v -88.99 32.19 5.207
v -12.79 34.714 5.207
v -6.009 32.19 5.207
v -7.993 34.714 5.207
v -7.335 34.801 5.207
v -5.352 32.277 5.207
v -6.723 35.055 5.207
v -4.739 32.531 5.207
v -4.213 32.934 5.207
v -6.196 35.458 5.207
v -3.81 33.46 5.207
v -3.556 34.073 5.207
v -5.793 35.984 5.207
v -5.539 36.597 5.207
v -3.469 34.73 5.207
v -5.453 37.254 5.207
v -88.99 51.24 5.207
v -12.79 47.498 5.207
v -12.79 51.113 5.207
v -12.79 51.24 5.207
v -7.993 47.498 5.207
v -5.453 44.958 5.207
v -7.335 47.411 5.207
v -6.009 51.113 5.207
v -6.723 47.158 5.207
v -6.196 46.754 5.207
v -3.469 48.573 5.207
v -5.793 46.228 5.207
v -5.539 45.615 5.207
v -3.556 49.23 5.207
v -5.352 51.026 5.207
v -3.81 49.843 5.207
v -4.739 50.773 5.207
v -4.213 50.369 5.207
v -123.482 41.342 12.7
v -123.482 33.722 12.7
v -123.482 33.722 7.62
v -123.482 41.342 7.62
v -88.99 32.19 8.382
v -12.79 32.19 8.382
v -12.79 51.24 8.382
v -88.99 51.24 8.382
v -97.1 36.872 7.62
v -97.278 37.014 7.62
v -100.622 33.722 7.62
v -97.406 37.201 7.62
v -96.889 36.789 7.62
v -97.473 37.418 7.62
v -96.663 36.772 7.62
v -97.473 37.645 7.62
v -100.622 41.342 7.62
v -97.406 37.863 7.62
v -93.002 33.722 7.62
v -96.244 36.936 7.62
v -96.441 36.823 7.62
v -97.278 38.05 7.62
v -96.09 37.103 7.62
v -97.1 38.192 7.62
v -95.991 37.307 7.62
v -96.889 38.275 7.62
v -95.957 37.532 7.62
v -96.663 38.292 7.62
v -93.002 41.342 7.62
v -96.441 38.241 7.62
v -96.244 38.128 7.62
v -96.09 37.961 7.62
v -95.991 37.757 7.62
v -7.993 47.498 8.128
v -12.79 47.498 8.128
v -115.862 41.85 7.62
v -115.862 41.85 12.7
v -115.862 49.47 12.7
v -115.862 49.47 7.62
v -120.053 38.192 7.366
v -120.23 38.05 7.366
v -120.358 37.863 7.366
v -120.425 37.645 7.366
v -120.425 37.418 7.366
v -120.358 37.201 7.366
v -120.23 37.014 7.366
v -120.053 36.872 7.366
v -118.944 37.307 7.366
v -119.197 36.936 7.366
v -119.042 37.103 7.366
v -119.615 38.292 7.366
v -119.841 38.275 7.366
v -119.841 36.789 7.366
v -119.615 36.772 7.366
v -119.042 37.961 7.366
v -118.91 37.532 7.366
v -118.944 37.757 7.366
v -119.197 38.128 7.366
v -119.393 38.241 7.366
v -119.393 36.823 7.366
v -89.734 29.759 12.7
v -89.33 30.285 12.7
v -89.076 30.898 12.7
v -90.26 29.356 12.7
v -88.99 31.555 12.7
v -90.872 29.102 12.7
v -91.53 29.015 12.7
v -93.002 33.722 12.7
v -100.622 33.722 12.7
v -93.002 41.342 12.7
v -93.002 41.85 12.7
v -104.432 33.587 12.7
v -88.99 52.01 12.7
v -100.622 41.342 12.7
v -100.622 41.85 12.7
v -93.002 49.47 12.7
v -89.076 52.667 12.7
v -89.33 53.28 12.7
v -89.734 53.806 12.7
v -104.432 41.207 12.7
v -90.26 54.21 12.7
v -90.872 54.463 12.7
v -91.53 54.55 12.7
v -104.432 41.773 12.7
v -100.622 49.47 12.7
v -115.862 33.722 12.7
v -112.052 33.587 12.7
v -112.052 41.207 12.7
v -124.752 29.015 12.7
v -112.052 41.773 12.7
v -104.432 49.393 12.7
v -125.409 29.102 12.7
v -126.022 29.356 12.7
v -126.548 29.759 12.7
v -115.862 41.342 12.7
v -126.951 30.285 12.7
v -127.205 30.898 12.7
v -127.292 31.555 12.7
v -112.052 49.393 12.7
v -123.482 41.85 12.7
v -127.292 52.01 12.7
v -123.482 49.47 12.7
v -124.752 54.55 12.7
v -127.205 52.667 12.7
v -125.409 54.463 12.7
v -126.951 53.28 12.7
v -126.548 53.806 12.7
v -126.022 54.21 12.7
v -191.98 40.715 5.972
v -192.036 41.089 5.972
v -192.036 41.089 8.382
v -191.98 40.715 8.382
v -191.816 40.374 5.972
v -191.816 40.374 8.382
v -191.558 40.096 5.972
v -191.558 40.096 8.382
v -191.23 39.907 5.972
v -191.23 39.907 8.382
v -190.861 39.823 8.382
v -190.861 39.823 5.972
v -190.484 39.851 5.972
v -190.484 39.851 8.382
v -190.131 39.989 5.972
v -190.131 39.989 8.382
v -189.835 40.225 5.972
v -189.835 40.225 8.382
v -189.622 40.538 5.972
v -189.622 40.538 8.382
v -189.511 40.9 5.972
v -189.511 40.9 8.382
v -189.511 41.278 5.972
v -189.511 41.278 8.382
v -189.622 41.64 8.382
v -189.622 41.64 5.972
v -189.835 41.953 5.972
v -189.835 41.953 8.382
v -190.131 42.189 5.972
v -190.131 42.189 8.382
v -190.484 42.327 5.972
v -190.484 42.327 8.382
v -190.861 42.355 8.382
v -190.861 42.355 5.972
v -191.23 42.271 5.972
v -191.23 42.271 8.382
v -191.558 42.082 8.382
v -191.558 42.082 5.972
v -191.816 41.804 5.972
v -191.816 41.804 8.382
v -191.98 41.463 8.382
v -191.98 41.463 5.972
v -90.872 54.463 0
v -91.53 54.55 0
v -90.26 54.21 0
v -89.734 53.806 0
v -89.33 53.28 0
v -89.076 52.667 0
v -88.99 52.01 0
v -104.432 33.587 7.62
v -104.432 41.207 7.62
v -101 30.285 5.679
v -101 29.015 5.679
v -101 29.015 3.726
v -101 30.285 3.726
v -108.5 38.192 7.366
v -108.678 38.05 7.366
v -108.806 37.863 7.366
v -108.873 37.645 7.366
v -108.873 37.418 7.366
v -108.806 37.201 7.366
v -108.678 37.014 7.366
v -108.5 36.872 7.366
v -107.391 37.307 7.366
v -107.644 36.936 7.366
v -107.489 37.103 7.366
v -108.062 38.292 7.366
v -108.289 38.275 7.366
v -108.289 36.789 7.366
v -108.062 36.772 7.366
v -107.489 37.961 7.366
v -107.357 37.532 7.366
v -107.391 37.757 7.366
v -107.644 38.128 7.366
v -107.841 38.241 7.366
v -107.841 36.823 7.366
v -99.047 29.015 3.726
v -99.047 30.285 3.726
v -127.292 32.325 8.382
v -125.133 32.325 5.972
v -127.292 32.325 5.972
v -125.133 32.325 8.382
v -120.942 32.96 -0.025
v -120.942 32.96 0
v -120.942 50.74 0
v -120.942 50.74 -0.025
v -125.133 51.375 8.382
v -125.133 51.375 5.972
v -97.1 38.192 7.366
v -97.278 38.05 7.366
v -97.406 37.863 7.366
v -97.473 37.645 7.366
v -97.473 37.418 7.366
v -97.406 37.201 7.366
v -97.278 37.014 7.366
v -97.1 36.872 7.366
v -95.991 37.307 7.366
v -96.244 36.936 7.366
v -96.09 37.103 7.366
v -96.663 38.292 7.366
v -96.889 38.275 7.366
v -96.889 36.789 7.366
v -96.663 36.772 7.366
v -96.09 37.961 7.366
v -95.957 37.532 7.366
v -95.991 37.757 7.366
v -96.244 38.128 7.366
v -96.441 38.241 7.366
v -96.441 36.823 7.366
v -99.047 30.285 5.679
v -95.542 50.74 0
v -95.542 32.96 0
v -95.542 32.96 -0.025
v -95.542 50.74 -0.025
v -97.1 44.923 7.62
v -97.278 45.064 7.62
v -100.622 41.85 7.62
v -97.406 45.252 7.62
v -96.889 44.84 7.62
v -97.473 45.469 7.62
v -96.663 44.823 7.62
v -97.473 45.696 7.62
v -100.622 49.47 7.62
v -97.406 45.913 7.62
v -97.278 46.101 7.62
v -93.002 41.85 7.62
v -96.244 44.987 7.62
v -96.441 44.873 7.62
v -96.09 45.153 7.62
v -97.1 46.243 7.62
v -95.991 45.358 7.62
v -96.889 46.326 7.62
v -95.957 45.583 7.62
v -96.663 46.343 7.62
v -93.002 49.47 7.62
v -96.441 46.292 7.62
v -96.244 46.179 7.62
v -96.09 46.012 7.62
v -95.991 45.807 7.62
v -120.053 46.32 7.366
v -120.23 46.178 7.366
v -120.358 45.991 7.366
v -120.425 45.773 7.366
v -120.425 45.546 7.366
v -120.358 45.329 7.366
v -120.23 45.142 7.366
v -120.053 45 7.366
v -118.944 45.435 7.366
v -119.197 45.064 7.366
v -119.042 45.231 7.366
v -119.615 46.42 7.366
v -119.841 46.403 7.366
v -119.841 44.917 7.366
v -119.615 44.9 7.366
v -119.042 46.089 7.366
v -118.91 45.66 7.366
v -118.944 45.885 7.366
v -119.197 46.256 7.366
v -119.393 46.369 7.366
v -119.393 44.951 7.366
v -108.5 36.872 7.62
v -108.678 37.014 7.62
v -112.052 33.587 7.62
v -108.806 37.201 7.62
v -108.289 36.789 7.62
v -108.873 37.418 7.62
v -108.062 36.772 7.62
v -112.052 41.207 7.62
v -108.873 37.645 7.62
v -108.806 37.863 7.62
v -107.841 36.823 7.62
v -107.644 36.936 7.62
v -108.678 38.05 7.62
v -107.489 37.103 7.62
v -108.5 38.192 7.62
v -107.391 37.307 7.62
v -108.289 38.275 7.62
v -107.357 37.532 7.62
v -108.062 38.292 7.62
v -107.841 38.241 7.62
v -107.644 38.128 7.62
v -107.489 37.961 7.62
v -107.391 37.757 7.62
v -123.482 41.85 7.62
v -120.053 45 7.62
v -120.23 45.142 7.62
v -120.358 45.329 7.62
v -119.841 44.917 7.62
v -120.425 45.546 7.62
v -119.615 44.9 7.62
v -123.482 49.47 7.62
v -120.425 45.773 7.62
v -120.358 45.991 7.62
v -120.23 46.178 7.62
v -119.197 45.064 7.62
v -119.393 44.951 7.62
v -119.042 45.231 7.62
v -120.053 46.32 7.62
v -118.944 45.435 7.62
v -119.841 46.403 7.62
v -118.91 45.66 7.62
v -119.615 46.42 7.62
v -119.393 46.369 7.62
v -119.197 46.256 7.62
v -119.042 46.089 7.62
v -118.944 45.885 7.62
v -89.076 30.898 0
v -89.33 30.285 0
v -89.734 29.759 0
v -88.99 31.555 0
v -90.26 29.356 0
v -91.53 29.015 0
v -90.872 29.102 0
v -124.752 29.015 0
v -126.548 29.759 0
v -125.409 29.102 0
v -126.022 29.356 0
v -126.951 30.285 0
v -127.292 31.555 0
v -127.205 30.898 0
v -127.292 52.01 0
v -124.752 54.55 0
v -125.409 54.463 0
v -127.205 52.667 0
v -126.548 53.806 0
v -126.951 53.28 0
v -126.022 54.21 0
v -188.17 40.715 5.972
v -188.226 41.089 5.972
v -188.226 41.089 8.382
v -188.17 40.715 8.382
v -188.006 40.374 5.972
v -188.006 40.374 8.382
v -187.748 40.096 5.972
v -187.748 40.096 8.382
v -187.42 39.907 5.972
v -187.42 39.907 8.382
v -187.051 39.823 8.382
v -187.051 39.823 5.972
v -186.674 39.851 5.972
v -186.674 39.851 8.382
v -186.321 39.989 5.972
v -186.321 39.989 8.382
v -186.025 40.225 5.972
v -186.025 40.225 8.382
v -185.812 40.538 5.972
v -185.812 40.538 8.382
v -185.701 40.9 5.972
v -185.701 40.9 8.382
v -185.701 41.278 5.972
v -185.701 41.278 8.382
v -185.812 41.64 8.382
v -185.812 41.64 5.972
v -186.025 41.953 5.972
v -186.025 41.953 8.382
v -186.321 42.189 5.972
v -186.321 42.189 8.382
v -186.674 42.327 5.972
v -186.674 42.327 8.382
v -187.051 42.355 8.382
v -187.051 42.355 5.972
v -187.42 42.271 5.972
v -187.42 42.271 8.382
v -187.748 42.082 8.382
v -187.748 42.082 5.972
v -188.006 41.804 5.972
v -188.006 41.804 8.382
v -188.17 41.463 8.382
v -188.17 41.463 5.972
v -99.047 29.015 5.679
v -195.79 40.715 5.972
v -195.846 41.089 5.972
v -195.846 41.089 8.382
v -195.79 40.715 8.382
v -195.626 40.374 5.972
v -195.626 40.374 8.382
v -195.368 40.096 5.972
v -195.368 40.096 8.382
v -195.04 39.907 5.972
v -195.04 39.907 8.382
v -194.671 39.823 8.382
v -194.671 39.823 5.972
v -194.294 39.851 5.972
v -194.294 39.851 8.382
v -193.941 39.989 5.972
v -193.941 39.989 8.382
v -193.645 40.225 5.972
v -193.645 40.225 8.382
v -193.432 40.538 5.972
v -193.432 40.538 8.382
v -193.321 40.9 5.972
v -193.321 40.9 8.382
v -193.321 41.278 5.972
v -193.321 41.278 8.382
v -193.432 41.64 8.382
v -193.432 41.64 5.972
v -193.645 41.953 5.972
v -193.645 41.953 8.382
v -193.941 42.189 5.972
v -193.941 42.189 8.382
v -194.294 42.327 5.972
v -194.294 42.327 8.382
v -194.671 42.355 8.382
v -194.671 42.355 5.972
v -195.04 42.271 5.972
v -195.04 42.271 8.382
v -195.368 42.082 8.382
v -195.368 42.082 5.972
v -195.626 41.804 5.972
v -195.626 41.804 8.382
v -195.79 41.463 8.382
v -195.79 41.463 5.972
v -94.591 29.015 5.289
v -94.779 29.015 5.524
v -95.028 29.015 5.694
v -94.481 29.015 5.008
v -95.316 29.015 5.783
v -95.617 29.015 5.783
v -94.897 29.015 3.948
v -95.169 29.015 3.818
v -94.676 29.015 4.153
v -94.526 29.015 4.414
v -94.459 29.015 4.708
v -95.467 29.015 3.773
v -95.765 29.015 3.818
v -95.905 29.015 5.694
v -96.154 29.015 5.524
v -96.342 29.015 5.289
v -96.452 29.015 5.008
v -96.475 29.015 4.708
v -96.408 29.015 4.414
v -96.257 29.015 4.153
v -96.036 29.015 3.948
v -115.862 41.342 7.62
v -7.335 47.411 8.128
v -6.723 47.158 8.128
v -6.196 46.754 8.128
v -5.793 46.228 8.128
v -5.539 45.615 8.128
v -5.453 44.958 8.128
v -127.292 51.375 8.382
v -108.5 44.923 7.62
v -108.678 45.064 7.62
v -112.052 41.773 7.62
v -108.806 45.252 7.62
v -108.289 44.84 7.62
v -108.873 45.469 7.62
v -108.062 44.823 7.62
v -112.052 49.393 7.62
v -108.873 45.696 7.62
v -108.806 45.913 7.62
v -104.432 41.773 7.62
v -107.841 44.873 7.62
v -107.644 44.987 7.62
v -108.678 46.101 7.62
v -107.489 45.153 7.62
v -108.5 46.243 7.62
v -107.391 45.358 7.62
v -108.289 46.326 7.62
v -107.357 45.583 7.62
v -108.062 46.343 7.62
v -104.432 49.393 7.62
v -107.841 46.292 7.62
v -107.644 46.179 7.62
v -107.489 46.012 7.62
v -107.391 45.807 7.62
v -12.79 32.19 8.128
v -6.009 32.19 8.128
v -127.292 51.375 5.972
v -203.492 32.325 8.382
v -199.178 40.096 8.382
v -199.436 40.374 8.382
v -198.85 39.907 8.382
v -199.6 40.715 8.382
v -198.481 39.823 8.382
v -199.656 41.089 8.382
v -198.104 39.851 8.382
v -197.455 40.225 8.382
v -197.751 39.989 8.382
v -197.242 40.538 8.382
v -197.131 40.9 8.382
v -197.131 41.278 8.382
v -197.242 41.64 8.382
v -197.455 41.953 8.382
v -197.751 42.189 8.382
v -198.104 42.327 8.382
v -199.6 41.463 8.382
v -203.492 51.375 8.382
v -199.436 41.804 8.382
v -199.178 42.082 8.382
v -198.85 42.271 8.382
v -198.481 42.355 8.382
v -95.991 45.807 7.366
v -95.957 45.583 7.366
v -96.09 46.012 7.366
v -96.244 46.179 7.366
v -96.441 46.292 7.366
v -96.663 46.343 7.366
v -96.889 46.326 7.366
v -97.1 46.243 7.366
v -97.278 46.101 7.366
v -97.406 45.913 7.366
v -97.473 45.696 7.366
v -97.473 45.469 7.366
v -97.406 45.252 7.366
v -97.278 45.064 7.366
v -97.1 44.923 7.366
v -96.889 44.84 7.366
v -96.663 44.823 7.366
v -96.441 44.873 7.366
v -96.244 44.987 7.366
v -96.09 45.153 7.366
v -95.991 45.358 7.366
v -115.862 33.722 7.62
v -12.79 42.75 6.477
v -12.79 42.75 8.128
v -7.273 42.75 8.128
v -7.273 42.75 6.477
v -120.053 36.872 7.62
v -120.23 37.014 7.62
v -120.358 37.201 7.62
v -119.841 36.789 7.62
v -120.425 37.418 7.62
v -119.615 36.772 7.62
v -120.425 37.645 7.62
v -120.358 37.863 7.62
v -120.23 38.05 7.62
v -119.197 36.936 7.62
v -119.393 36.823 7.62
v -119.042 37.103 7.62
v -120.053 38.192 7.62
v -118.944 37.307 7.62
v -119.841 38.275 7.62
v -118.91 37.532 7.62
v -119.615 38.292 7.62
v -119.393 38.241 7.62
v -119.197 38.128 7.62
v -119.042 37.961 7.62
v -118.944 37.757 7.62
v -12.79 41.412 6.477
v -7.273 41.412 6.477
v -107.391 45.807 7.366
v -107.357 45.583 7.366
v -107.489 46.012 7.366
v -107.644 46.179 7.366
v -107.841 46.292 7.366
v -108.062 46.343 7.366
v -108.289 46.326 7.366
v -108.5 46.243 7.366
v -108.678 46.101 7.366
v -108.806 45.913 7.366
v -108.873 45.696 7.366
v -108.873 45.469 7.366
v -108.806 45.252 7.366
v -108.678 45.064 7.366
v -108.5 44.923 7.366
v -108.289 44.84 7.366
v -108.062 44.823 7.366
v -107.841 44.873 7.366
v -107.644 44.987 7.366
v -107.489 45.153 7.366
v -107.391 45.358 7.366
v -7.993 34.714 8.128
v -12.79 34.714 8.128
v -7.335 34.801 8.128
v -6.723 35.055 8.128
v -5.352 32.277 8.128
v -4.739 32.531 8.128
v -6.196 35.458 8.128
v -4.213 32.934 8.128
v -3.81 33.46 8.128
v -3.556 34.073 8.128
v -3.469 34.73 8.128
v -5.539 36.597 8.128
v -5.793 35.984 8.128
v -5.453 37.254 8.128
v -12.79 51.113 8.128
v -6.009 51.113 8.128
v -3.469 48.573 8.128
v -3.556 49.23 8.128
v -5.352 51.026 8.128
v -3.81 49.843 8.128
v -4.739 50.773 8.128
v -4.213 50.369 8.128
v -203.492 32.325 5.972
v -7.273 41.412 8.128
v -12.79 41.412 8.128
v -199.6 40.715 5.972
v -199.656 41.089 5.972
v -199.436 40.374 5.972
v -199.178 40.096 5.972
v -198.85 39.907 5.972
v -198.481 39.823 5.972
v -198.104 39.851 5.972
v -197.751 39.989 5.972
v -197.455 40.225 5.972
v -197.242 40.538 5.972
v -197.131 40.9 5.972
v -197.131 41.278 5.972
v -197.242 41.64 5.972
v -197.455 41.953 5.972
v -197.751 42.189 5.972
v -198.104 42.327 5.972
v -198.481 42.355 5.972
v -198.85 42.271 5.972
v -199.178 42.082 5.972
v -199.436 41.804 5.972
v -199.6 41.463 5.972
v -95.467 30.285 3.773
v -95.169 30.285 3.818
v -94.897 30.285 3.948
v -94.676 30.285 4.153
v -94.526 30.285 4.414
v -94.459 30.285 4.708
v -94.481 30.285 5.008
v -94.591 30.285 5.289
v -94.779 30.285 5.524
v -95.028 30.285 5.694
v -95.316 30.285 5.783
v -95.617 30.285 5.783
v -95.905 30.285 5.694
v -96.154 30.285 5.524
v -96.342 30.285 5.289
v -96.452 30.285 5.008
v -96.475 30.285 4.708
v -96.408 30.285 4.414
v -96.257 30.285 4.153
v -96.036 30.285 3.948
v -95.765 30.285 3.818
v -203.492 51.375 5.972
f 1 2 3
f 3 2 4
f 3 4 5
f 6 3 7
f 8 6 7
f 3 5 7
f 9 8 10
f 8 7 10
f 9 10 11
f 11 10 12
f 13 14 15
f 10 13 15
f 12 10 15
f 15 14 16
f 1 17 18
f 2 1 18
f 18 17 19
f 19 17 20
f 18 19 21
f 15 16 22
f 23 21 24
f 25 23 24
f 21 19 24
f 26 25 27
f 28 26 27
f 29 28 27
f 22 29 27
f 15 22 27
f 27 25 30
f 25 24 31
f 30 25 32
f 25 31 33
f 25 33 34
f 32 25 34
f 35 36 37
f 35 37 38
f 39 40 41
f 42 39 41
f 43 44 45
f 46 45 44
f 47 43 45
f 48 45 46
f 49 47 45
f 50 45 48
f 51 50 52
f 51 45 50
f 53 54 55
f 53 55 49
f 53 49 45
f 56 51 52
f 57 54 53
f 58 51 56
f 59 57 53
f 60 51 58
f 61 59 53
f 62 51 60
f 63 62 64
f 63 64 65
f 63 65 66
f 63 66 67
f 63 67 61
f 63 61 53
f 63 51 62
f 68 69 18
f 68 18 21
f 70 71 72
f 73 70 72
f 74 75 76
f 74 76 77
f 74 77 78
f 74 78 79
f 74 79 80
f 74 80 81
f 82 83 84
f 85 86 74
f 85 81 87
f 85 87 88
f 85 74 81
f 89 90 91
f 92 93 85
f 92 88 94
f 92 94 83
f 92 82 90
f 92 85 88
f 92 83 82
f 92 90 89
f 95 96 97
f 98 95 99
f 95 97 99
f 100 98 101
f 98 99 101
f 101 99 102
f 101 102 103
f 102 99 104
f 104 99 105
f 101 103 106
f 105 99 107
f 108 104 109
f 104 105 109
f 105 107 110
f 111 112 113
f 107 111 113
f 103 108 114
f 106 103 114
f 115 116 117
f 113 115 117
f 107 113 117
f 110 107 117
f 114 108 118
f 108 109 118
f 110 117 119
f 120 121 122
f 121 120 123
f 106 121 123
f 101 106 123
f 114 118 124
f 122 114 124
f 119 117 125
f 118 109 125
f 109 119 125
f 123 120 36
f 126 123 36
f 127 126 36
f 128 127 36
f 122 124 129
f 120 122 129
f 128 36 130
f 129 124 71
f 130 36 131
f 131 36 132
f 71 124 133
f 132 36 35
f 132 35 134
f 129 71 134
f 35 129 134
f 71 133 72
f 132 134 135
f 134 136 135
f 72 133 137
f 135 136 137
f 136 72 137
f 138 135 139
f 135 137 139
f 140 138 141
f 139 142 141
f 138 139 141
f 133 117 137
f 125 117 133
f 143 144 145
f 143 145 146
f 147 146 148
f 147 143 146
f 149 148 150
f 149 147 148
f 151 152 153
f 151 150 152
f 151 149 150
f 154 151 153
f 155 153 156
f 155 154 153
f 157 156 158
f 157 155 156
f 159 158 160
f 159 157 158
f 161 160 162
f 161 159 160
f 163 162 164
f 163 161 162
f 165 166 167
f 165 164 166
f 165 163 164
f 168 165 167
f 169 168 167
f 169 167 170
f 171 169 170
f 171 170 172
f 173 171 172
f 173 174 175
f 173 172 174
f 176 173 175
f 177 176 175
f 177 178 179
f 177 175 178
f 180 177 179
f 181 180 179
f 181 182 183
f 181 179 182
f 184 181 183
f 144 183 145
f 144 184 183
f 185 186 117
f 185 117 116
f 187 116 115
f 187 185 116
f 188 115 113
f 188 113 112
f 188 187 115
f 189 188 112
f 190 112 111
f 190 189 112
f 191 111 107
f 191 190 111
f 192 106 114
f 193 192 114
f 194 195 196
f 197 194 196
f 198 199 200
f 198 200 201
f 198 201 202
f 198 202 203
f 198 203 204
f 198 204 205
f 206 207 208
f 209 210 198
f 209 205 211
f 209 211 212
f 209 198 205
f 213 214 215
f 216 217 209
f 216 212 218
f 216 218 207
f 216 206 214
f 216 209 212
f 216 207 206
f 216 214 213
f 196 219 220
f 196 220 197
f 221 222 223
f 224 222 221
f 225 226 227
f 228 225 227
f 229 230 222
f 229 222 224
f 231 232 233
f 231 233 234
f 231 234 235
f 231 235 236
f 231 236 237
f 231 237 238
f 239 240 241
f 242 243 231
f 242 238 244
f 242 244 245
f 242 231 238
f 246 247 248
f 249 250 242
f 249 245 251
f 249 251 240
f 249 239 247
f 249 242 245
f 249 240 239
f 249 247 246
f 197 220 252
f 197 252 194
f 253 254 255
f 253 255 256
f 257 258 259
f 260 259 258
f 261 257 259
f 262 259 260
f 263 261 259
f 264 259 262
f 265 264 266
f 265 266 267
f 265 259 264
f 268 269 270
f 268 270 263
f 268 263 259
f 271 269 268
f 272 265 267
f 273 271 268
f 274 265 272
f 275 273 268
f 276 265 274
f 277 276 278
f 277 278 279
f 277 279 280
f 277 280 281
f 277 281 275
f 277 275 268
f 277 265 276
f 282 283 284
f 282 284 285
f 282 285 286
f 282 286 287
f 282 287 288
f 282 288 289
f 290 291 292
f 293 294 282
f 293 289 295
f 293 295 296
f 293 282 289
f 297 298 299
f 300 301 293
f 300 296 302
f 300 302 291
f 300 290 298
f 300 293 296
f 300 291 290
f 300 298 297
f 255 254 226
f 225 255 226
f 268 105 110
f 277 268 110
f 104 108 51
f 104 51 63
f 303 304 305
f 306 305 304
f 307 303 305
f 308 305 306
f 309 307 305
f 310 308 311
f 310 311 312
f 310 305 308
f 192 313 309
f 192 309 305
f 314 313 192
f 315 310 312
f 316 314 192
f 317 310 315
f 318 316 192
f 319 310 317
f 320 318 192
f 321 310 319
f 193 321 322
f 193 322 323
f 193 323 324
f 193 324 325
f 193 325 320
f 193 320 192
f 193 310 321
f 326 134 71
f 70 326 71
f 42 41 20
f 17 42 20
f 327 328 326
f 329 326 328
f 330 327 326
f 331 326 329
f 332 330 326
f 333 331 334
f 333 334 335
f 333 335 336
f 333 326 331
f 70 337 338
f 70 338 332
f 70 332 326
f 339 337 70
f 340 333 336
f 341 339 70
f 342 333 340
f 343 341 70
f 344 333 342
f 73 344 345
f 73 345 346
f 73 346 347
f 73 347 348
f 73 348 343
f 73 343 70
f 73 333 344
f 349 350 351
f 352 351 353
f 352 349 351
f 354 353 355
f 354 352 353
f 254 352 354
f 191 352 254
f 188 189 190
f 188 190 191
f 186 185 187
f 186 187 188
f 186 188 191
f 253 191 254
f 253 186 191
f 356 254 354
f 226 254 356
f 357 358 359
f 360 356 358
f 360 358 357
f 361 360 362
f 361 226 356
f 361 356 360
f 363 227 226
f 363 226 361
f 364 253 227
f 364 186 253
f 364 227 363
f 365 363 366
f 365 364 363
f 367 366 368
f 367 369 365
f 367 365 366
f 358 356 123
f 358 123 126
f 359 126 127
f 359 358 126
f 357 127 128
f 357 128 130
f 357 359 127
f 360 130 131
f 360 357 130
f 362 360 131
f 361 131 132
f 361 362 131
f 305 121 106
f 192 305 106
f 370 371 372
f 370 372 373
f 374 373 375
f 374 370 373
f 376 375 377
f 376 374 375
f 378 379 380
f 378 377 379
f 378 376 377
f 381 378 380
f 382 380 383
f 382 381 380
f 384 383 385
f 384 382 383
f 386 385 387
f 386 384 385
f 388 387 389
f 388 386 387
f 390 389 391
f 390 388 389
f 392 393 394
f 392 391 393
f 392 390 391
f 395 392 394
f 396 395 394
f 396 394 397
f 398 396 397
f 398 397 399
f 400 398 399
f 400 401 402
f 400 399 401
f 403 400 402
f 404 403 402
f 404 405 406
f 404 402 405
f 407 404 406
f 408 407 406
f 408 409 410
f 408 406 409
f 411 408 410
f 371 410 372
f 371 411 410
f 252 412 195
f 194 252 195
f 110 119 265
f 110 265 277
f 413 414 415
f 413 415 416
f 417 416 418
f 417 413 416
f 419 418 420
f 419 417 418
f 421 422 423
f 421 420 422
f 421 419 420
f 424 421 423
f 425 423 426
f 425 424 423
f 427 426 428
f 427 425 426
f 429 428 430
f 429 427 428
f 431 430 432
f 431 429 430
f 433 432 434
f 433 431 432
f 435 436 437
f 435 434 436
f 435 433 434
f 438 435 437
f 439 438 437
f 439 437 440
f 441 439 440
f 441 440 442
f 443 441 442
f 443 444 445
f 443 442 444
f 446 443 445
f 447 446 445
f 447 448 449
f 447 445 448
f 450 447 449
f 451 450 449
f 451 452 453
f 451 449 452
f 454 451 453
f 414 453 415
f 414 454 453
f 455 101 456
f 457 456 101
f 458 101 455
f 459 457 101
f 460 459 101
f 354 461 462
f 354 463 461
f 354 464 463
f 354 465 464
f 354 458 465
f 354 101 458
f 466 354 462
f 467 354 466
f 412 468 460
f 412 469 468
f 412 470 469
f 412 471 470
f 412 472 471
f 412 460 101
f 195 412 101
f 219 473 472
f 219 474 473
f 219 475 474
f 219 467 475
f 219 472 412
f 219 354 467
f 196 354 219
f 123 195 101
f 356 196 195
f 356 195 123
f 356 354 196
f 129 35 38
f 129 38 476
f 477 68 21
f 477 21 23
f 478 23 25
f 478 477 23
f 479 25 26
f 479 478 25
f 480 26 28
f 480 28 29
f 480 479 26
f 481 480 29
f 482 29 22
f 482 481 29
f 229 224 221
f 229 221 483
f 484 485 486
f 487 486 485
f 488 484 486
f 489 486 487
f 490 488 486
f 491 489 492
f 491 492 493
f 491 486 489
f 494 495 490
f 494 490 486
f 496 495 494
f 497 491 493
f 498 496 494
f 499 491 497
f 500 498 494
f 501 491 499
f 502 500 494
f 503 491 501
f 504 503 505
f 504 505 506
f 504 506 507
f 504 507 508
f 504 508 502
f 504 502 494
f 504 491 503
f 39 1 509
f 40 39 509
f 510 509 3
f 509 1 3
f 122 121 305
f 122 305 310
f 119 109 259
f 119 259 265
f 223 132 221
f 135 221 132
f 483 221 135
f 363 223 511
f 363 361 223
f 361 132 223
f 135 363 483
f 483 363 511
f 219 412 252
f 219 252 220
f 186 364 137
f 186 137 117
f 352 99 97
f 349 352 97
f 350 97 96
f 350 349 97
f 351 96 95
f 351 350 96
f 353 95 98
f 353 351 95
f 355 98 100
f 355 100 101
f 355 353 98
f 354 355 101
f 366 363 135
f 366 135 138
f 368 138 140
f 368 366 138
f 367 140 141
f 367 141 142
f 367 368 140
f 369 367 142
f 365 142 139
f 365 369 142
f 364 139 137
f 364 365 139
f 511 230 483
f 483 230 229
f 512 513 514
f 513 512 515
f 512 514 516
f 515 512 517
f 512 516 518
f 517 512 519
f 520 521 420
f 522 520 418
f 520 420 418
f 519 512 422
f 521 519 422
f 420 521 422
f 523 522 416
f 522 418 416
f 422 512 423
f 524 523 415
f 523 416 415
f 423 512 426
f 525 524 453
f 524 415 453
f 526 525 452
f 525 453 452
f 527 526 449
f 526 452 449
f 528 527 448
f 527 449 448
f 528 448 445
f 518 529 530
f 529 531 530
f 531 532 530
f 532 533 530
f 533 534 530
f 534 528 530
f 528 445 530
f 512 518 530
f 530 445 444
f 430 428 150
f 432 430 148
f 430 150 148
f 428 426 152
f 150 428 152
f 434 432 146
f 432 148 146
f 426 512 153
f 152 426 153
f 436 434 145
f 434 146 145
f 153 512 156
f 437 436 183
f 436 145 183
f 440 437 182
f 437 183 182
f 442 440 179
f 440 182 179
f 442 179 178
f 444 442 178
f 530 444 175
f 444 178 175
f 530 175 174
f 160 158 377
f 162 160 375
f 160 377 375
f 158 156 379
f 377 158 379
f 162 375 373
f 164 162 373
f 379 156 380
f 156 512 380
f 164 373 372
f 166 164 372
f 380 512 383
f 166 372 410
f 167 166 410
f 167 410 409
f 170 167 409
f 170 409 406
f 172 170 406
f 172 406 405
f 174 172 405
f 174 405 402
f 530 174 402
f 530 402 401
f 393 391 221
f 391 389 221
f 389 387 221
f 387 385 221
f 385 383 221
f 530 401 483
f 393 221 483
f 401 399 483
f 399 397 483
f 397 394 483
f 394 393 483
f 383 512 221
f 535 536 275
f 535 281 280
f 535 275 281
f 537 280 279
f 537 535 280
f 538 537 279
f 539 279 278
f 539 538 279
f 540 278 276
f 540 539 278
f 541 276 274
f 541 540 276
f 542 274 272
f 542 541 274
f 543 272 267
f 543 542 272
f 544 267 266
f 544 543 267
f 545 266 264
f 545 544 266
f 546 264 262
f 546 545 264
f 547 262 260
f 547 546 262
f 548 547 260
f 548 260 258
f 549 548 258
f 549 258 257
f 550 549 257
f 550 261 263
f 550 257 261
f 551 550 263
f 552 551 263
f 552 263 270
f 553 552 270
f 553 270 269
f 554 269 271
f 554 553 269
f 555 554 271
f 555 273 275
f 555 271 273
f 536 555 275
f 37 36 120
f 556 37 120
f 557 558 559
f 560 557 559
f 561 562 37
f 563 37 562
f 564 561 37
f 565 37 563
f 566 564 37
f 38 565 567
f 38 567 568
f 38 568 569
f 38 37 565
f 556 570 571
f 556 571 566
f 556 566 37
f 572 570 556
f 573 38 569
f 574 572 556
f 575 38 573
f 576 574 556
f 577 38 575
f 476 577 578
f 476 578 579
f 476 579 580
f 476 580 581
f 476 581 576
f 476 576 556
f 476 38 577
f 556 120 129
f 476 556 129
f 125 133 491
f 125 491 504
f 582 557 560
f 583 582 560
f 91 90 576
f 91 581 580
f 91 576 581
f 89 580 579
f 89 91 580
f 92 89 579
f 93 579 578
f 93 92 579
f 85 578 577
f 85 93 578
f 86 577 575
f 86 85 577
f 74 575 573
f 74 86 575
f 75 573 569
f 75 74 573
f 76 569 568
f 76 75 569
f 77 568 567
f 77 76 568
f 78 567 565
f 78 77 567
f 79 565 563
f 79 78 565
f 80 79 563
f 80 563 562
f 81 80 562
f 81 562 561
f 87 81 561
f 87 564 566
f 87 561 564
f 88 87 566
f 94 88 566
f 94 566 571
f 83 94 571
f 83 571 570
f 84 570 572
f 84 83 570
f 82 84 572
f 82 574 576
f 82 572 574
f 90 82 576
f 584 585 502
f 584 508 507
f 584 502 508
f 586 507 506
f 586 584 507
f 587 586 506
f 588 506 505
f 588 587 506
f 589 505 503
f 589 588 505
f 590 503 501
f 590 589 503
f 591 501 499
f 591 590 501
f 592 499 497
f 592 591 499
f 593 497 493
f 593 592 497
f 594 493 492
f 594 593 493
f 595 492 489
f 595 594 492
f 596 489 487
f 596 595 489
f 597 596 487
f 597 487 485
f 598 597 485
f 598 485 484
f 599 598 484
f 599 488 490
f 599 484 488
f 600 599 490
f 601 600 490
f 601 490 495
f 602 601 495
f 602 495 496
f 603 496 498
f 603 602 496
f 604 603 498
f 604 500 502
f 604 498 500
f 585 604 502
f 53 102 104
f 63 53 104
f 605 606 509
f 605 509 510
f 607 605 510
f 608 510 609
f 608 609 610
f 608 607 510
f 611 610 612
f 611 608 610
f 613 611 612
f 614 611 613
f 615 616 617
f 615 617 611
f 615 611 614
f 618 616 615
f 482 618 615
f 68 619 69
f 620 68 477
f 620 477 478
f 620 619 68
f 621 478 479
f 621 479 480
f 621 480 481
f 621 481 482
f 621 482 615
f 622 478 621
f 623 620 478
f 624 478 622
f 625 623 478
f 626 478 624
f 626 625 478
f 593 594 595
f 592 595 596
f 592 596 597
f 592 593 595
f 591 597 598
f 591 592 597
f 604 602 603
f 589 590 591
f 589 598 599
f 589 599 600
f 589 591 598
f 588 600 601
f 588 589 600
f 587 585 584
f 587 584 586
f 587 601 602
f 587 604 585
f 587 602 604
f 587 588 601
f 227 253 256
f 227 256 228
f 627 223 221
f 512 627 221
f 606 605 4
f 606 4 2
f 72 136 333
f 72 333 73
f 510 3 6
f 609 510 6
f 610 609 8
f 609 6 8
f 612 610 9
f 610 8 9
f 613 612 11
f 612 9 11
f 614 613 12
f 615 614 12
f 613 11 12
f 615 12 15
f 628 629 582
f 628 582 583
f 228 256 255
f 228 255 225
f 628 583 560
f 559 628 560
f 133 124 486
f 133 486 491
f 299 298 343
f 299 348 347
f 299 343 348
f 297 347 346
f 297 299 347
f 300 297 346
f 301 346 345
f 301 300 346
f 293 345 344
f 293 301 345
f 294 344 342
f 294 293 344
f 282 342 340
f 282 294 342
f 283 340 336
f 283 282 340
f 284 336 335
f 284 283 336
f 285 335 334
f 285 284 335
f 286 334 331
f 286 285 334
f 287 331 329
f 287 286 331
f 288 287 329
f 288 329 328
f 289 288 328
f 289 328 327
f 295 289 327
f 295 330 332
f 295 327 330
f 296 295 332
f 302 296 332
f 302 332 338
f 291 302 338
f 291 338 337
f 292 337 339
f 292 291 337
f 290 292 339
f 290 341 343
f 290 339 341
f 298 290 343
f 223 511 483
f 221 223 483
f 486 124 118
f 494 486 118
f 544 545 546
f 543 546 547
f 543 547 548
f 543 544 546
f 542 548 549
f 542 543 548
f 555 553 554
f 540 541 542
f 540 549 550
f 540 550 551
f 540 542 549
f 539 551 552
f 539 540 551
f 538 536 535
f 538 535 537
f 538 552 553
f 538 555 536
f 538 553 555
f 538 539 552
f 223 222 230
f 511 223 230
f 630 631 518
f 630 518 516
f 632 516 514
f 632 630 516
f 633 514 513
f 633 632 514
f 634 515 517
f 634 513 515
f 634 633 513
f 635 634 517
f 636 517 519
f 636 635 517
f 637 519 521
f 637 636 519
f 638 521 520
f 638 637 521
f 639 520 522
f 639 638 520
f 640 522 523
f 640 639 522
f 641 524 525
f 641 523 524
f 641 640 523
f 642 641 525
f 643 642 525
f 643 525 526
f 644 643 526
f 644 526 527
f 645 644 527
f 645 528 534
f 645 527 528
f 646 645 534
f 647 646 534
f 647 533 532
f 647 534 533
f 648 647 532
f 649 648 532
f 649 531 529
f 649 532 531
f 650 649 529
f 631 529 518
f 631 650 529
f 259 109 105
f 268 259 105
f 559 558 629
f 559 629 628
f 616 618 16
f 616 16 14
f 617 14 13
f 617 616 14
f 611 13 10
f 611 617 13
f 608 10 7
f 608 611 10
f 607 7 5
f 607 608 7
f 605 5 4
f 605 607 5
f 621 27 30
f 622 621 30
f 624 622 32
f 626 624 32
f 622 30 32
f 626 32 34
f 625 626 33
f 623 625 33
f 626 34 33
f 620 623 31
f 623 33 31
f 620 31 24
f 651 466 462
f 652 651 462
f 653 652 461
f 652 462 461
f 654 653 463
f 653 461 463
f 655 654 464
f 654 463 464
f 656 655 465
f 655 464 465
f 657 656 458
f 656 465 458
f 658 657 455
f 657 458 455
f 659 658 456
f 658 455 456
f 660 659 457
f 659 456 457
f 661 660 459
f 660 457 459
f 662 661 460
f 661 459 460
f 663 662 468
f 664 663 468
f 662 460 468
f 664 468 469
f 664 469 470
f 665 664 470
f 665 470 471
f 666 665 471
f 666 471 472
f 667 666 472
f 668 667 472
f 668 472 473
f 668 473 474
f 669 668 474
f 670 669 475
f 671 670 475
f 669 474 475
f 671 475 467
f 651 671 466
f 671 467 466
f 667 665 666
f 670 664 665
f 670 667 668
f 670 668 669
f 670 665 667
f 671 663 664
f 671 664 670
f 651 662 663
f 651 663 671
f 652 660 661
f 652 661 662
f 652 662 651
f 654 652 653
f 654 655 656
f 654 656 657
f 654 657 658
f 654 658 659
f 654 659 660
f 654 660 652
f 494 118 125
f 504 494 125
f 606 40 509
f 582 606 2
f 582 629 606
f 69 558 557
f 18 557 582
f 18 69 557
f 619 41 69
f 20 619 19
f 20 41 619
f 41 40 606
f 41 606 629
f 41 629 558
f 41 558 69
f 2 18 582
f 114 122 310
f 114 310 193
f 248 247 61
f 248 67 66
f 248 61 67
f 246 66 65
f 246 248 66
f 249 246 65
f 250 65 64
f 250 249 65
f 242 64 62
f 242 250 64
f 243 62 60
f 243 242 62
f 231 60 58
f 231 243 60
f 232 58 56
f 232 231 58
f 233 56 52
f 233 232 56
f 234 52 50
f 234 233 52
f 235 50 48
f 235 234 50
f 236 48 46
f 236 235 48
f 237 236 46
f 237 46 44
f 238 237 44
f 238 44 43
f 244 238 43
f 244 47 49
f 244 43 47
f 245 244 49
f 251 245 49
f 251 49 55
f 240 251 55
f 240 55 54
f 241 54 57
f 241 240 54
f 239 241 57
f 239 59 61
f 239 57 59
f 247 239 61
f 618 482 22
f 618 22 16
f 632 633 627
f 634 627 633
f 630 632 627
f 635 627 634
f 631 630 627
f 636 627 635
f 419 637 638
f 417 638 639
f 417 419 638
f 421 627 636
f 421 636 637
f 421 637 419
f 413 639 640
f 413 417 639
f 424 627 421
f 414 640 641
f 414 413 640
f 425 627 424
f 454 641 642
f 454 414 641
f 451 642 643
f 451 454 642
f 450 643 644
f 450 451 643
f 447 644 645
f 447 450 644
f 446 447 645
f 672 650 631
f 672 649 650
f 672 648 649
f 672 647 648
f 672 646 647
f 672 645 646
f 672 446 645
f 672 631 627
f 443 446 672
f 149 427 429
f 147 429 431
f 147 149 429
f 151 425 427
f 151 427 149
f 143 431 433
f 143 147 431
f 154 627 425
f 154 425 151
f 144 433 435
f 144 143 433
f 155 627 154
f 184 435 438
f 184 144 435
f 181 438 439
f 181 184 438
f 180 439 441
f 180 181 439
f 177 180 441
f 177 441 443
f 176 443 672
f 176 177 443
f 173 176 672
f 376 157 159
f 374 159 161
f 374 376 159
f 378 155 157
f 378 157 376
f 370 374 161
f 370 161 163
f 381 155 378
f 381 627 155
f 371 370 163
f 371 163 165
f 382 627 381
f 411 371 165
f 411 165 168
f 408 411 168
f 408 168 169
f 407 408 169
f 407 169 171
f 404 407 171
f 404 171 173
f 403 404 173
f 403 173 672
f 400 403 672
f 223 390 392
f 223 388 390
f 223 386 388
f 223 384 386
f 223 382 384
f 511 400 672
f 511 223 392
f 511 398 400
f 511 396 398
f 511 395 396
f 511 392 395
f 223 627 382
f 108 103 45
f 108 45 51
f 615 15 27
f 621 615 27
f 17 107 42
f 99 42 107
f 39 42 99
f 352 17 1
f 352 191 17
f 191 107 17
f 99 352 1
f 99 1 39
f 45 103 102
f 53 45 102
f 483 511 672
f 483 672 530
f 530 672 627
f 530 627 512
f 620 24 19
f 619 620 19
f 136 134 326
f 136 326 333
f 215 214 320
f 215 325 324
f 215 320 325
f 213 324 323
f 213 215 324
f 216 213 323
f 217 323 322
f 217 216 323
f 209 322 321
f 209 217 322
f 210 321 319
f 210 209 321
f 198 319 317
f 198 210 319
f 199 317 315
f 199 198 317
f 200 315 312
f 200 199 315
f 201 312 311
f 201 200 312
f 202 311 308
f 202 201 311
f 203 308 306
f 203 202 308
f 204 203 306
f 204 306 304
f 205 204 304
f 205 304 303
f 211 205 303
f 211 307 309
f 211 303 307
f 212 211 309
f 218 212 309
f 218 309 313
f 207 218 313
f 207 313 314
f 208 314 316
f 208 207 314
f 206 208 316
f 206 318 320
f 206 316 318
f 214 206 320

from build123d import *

# Parameters (mm, degrees)
BOSS_EXTRUDE2_DEPTH     = 12.7
SKETCH4_W               = 7.62
SKETCH4_H               = 7.62
CUT_EXTRUDE1_DEPTH      = 5.08
SKETCH5_R               = 1.010710011
SKETCH5_W               = 1.95310334
SKETCH5_H               = 1.953103341
CUT_EXTRUDE2_DEPTH      = 1.27
CUT_EXTRUDE6_DEPTH      = 0.508
CUT_EXTRUDE6_DEPTH_BACK = 0.254
SKETCH6_R               = 0.762
BOSS_EXTRUDE3_START     = -2.159
BOSS_EXTRUDE3_OUTLINE_W = 2.409740232
BOSS_EXTRUDE3_OUTLINE_H = 19.05
BOSS_EXTRUDE3_DEPTH     = 2.159
SKETCH8_W               = 3.175
SKETCH8_H               = 19.05
BOSS_EXTRUDE4_DEPTH     = 76.2
SKETCH9_W               = 25.4
SKETCH9_H               = 17.78
BOSS_EXTRUDE5_DEPTH     = 0.0254
SKETCH7_2_W             = 2.409740232
SKETCH7_2_H             = 19.05
BOSS_EXTRUDE6_DEPTH     = 76.2
CUT_EXTRUDE7_DEPTH      = 38.989
CUT_EXTRUDE7_DEPTH_BACK = 41.529
SKETCH15_R              = 1.27
BOSS_EXTRUDE8_DEPTH     = 2.921
CUT_EXTRUDE8_DEPTH      = 2.921
SKETCH22_W              = 5.599128384
SKETCH22_H              = 1.338572143
BOSS_EXTRUDE9_DEPTH     = 1.651


# Read off the part's stored shape, not the designer's step: Boss-Extrude3
with BuildPart() as part:
    # Sketch3 → Boss-Extrude2 (new body)
    with BuildSketch(Plane.XY):
        with BuildLine():
            Line((-124.751722325, 54.549920467), (-91.529763067, 54.549920467))
            ThreePointArc((-91.529763067, 54.549920467), (-89.733711843, 53.805971692), (-88.989763067, 52.009920467))
            Line((-88.989763067, 52.009920467), (-88.989763067, 31.555280962))
            ThreePointArc((-88.989763067, 31.555280962), (-89.733711843, 29.759229738), (-91.529763067, 29.015280962))
            Line((-91.529763067, 29.015280962), (-124.751722325, 29.015280962))
            ThreePointArc((-124.751722325, 29.015280962), (-126.547773549, 29.759229738), (-127.291722325, 31.555280962))
            Line((-127.291722325, 31.555280962), (-127.291722325, 52.009920467))
            ThreePointArc((-127.291722325, 52.009920467), (-126.547773549, 53.805971692), (-124.751722325, 54.549920467))
        make_face()
    extrude(amount=BOSS_EXTRUDE2_DEPTH)

    # Sketch4 → Cut-Extrude1 (cut)
    with BuildSketch(Plane.XY.offset(12.7)):
        with Locations((-119.671722325, 45.659920467)):
            Rectangle(SKETCH4_W, SKETCH4_H)
        with Locations((-96.811722325, 45.659920467)):
            Rectangle(SKETCH4_W, SKETCH4_H)
        Polygon((-13.53517885, 41.715280962), (0, 47.630459812), (0, 34.095280962), (-13.53517885, 34.095280962), align=None)
        with Locations((-108.241722325, 45.582744839)):
            Rectangle(SKETCH4_W, SKETCH4_H)
        with Locations((-96.811722325, 37.531920467)):
            Rectangle(SKETCH4_W, SKETCH4_H)
        with Locations((-119.671722325, 37.531920467)):
            Rectangle(SKETCH4_W, SKETCH4_H)
        with Locations((-108.241722325, 37.397280962)):
            Rectangle(SKETCH4_W, SKETCH4_H)
    extrude(amount=-CUT_EXTRUDE1_DEPTH, mode=Mode.SUBTRACT)

    # Sketch5 → Cut-Extrude2 (cut)
    with BuildSketch(Plane(origin=(0, 29.015280962, 0), x_dir=(-1, 0, 0), z_dir=(0, -1, 0))):
        with Locations(Location((95.466660312, -4.783448362, 0), (0, 0, 90))):
            Circle(SKETCH5_R)
        with Locations((100.02390144, -4.702069057)):
            Rectangle(SKETCH5_W, SKETCH5_H)
    extrude(amount=-CUT_EXTRUDE2_DEPTH, mode=Mode.SUBTRACT)

    # Sketch6 → Cut-Extrude6 (cut, two sides: drawn at the far end of the back side and taken through both)
    with BuildSketch(Plane.XY.offset(7.62).offset(-CUT_EXTRUDE6_DEPTH_BACK)):
        with Locations((-119.671722325, 45.659920467)):
            Circle(SKETCH6_R)
        with Locations((-108.119080998, 45.582744839)):
            Circle(SKETCH6_R)
        with Locations((-96.719484025, 37.531920467)):
            Circle(SKETCH6_R)
        with Locations((-96.719484025, 45.582744839)):
            Circle(SKETCH6_R)
        with Locations((-119.671722325, 37.531920467)):
            Circle(SKETCH6_R)
        with Locations((-108.119080998, 37.531920467)):
            Circle(SKETCH6_R)
    extrude(amount=CUT_EXTRUDE6_DEPTH + CUT_EXTRUDE6_DEPTH_BACK, mode=Mode.SUBTRACT)

    # Boss-Extrude3 outline → Boss-Extrude3 (cut)
    with BuildSketch(Plane.ZY.offset(127.291722325).offset(BOSS_EXTRUDE3_START)):
        with Locations((7.177129884, 41.849920467)):
            Rectangle(BOSS_EXTRUDE3_OUTLINE_W, BOSS_EXTRUDE3_OUTLINE_H)
    extrude(amount=BOSS_EXTRUDE3_DEPTH, mode=Mode.SUBTRACT)

    # Sketch8 → Boss-Extrude4 (add)
    with BuildSketch(Plane(origin=(-88.989763067, 0, 0), x_dir=(0, 0, -1), z_dir=(1, 0, 0))):
        with Locations((-6.7945, 41.715280962)):
            Rectangle(SKETCH8_W, SKETCH8_H)
    extrude(amount=BOSS_EXTRUDE4_DEPTH)

    # Sketch9 → Boss-Extrude5 (add)
    with BuildSketch(Plane(origin=(0, 0, 0), x_dir=(-1, 0, 0), z_dir=(0, 0, -1))):
        with Locations((108.241722325, 41.849920467)):
            Rectangle(SKETCH9_W, SKETCH9_H)
    extrude(amount=BOSS_EXTRUDE5_DEPTH)

    # Sketch18 → Boss-Extrude8 (add)
    with BuildSketch(Plane(origin=(0, 0, 5.207), x_dir=(-1, 0, 0), z_dir=(0, 0, -1))):
        with BuildLine():
            Line((12.789763067, 32.190280962), (6.009318879, 32.190280962))
            ThreePointArc((6.009318879, 32.190280962), (4.213267655, 32.934229738), (3.469318879, 34.730280962))
            Line((3.469318879, 34.730280962), (3.469318879, 48.572942797))
            ThreePointArc((3.469318879, 48.572942797), (4.213267655, 50.368994021), (6.009318879, 51.112942797))
            Line((6.009318879, 51.112942797), (12.789763067, 51.112942797))
            Line((12.789763067, 51.112942797), (12.789763067, 32.190280962))
        make_face()
    extrude(amount=-BOSS_EXTRUDE8_DEPTH)

    # Sketch19 → Cut-Extrude8 (cut)
    with BuildSketch(Plane.XY.offset(8.128)):
        with BuildLine():
            Line((-7.992540277, 34.714254039), (-12.789763067, 34.714254039))
            Line((-12.789763067, 34.714254039), (-12.789763067, 47.497812307))
            Line((-12.789763067, 47.497812307), (-7.992540277, 47.497812307))
            ThreePointArc((-7.992540277, 47.497812307), (-6.196489053, 46.753863531), (-5.452540277, 44.957812307))
            Line((-5.452540277, 44.957812307), (-5.452540277, 37.254254039))
            ThreePointArc((-5.452540277, 37.254254039), (-6.196489053, 35.458202815), (-7.992540277, 34.714254039))
        make_face()
    extrude(amount=-CUT_EXTRUDE8_DEPTH, mode=Mode.SUBTRACT)

    # Sketch22 → Boss-Extrude9 (add)
    with BuildSketch(Plane.XY.offset(8.128)):
        with Locations((-10.072305381, 42.081115795)):
            Rectangle(SKETCH22_W, SKETCH22_H)
    extrude(amount=-BOSS_EXTRUDE9_DEPTH)


with BuildPart() as body_2:
    # Sketch7<2> → Boss-Extrude6 (new body)
    with BuildSketch(Plane.ZY.offset(127.291722325)):
        with Locations((7.177129884, 41.849920467)):
            Rectangle(SKETCH7_2_W, SKETCH7_2_H)
    extrude(amount=BOSS_EXTRUDE6_DEPTH)

    # Sketch15 → Cut-Extrude7 (cut, two sides: drawn at the far end of the back side and taken through both)
    with BuildSketch(Plane.XY.offset(8.382).offset(-CUT_EXTRUDE7_DEPTH_BACK)):
        with Locations(Location((-198.386411658, 41.089038752, 0), (0, 0, 180))):
            Circle(SKETCH15_R)
        with Locations(Location((-194.576411658, 41.089038752, 0), (0, 0, 180))):
            Circle(SKETCH15_R)
        with Locations(Location((-190.766411658, 41.089038752, 0), (0, 0, 180))):
            Circle(SKETCH15_R)
        with Locations(Location((-186.956411658, 41.089038752, 0), (0, 0, 180))):
            Circle(SKETCH15_R)
    extrude(amount=CUT_EXTRUDE7_DEPTH + CUT_EXTRUDE7_DEPTH_BACK, mode=Mode.SUBTRACT)


solid = Compound([part.part, body_2.part])
